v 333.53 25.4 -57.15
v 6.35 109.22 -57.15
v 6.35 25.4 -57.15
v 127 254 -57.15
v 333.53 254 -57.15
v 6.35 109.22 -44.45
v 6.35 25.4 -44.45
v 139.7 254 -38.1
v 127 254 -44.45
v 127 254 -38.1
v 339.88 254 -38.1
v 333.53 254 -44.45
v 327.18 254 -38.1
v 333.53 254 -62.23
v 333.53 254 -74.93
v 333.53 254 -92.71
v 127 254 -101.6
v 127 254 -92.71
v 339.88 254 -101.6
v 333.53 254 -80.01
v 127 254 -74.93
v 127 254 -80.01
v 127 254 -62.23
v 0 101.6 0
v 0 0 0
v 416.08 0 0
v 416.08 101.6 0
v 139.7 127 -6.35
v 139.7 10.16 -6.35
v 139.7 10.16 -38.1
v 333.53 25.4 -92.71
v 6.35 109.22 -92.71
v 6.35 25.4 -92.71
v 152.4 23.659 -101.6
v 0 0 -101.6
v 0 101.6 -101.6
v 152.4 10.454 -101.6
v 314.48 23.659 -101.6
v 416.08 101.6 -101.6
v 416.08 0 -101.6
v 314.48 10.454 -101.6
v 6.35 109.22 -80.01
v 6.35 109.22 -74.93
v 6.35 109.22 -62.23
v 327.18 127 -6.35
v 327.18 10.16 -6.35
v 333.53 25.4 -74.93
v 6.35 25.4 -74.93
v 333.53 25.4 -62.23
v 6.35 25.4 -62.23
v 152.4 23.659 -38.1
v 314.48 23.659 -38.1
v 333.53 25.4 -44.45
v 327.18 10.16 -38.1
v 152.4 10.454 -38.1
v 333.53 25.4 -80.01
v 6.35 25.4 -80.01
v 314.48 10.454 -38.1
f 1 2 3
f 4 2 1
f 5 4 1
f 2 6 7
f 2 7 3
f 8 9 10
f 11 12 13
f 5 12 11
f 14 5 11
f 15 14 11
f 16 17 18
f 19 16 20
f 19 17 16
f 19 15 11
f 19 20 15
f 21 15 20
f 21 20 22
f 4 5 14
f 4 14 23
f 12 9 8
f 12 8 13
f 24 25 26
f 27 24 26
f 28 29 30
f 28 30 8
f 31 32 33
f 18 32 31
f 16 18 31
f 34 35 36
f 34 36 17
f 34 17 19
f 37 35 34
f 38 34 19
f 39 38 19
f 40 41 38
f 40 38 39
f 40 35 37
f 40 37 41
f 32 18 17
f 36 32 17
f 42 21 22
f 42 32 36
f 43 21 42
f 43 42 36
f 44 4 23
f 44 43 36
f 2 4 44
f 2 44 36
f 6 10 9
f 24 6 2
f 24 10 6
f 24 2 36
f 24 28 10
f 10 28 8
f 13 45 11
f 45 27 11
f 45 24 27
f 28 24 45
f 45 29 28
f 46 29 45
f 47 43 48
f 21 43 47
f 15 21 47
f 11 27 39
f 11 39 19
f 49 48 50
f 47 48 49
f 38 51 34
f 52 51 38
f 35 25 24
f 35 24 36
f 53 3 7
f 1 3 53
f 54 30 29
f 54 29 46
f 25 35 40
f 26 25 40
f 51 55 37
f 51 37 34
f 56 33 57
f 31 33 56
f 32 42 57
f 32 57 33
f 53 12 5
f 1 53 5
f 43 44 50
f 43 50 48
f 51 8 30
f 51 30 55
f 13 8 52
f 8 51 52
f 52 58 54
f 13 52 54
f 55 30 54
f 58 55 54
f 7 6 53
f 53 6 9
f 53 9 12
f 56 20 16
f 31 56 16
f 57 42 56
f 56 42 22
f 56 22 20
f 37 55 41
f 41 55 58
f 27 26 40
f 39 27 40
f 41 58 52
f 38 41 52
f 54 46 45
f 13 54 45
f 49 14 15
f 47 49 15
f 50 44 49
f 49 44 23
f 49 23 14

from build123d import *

# Parameters (mm, degrees)
SKETCH1_W           = 416.08
SKETCH1_H           = 101.6
BOSS_EXTRUDE2_DEPTH = 254
CUT_EXTRUDE1_DEPTH  = 101.6
CUT_EXTRUDE9_START  = 10.16
SKETCH6_W           = 187.48
SKETCH6_H           = 31.75
CUT_EXTRUDE9_DEPTH  = 244.84
SKETCH8_W           = 327.18
SKETCH8_H           = 12.7
CUT_EXTRUDE11_DEPTH = 228.6
CUT_EXTRUDE12_DEPTH = 417.08
CUT_EXTRUDE13_REACH = 65.5
SKETCH10_W          = 162.08
SKETCH10_H          = 13.204649201


with BuildPart() as part:
    # Sketch1 → Boss-Extrude2 (new body)
    with BuildSketch(Plane(origin=(0, 0, 0), x_dir=(1, 0, 0), z_dir=(0, 1, 0))):
        with Locations((208.04, 50.8)):
            Rectangle(SKETCH1_W, SKETCH1_H)
    extrude(amount=BOSS_EXTRUDE2_DEPTH)

    # Sketch2 → Cut-Extrude1 (cut)
    with BuildSketch(Plane.XY):
        Polygon((0, 101.6), (0, 254), (127, 254), align=None)
        Polygon((416.08, 254), (416.08, 101.6), (339.88, 254), align=None)
    extrude(amount=-CUT_EXTRUDE1_DEPTH, mode=Mode.SUBTRACT)

    # Sketch6 → Cut-Extrude9 (cut, through all)
    with BuildSketch(Plane(origin=(0, 0, 0), x_dir=(1, 0, 0), z_dir=(0, 1, 0)).offset(CUT_EXTRUDE9_START)):
        with Locations((233.44, 22.225)):
            Rectangle(SKETCH6_W, SKETCH6_H)
    extrude(amount=CUT_EXTRUDE9_DEPTH, mode=Mode.SUBTRACT)

    # Sketch8 → Cut-Extrude11 (cut)
    with BuildSketch(Plane(origin=(0, 254, 0), x_dir=(1, 0, 0), z_dir=(0, 1, 0))):
        with Locations((169.94, 50.8)):
            Rectangle(SKETCH8_W, SKETCH8_H)
        with Locations((169.94, 68.58)):
            Rectangle(SKETCH8_W, SKETCH8_H)
        with Locations((169.94, 86.36)):
            Rectangle(SKETCH8_W, SKETCH8_H)
    extrude(amount=-CUT_EXTRUDE11_DEPTH, mode=Mode.SUBTRACT)

    # Sketch9 → Cut-Extrude12 (cut, through all)
    with BuildSketch(Plane(origin=(416.08, 0, 0), x_dir=(0, 0, -1), z_dir=(1, 0, 0))):
        Polygon((0, 254), (0, 101.6), (38.1, 254), align=None)
    extrude(amount=-CUT_EXTRUDE12_DEPTH, mode=Mode.SUBTRACT)

    # Sketch10 → Cut-Extrude13 (cut, up to next)
    with BuildSketch(Plane.XY.offset(-38.1), mode=Mode.PRIVATE) as cut_extrude13_sk1:
        with Locations((233.44, 17.056383054)):
            Rectangle(SKETCH10_W, SKETCH10_H)
    cut_extrude13_tool1 = extrude(cut_extrude13_sk1.sketch, amount=-CUT_EXTRUDE13_REACH, mode=Mode.PRIVATE) & part.part
    add(cut_extrude13_tool1.solids().sort_by_distance((233.44, 17.056383, -38.1))[0], mode=Mode.SUBTRACT)


solid = part.part
